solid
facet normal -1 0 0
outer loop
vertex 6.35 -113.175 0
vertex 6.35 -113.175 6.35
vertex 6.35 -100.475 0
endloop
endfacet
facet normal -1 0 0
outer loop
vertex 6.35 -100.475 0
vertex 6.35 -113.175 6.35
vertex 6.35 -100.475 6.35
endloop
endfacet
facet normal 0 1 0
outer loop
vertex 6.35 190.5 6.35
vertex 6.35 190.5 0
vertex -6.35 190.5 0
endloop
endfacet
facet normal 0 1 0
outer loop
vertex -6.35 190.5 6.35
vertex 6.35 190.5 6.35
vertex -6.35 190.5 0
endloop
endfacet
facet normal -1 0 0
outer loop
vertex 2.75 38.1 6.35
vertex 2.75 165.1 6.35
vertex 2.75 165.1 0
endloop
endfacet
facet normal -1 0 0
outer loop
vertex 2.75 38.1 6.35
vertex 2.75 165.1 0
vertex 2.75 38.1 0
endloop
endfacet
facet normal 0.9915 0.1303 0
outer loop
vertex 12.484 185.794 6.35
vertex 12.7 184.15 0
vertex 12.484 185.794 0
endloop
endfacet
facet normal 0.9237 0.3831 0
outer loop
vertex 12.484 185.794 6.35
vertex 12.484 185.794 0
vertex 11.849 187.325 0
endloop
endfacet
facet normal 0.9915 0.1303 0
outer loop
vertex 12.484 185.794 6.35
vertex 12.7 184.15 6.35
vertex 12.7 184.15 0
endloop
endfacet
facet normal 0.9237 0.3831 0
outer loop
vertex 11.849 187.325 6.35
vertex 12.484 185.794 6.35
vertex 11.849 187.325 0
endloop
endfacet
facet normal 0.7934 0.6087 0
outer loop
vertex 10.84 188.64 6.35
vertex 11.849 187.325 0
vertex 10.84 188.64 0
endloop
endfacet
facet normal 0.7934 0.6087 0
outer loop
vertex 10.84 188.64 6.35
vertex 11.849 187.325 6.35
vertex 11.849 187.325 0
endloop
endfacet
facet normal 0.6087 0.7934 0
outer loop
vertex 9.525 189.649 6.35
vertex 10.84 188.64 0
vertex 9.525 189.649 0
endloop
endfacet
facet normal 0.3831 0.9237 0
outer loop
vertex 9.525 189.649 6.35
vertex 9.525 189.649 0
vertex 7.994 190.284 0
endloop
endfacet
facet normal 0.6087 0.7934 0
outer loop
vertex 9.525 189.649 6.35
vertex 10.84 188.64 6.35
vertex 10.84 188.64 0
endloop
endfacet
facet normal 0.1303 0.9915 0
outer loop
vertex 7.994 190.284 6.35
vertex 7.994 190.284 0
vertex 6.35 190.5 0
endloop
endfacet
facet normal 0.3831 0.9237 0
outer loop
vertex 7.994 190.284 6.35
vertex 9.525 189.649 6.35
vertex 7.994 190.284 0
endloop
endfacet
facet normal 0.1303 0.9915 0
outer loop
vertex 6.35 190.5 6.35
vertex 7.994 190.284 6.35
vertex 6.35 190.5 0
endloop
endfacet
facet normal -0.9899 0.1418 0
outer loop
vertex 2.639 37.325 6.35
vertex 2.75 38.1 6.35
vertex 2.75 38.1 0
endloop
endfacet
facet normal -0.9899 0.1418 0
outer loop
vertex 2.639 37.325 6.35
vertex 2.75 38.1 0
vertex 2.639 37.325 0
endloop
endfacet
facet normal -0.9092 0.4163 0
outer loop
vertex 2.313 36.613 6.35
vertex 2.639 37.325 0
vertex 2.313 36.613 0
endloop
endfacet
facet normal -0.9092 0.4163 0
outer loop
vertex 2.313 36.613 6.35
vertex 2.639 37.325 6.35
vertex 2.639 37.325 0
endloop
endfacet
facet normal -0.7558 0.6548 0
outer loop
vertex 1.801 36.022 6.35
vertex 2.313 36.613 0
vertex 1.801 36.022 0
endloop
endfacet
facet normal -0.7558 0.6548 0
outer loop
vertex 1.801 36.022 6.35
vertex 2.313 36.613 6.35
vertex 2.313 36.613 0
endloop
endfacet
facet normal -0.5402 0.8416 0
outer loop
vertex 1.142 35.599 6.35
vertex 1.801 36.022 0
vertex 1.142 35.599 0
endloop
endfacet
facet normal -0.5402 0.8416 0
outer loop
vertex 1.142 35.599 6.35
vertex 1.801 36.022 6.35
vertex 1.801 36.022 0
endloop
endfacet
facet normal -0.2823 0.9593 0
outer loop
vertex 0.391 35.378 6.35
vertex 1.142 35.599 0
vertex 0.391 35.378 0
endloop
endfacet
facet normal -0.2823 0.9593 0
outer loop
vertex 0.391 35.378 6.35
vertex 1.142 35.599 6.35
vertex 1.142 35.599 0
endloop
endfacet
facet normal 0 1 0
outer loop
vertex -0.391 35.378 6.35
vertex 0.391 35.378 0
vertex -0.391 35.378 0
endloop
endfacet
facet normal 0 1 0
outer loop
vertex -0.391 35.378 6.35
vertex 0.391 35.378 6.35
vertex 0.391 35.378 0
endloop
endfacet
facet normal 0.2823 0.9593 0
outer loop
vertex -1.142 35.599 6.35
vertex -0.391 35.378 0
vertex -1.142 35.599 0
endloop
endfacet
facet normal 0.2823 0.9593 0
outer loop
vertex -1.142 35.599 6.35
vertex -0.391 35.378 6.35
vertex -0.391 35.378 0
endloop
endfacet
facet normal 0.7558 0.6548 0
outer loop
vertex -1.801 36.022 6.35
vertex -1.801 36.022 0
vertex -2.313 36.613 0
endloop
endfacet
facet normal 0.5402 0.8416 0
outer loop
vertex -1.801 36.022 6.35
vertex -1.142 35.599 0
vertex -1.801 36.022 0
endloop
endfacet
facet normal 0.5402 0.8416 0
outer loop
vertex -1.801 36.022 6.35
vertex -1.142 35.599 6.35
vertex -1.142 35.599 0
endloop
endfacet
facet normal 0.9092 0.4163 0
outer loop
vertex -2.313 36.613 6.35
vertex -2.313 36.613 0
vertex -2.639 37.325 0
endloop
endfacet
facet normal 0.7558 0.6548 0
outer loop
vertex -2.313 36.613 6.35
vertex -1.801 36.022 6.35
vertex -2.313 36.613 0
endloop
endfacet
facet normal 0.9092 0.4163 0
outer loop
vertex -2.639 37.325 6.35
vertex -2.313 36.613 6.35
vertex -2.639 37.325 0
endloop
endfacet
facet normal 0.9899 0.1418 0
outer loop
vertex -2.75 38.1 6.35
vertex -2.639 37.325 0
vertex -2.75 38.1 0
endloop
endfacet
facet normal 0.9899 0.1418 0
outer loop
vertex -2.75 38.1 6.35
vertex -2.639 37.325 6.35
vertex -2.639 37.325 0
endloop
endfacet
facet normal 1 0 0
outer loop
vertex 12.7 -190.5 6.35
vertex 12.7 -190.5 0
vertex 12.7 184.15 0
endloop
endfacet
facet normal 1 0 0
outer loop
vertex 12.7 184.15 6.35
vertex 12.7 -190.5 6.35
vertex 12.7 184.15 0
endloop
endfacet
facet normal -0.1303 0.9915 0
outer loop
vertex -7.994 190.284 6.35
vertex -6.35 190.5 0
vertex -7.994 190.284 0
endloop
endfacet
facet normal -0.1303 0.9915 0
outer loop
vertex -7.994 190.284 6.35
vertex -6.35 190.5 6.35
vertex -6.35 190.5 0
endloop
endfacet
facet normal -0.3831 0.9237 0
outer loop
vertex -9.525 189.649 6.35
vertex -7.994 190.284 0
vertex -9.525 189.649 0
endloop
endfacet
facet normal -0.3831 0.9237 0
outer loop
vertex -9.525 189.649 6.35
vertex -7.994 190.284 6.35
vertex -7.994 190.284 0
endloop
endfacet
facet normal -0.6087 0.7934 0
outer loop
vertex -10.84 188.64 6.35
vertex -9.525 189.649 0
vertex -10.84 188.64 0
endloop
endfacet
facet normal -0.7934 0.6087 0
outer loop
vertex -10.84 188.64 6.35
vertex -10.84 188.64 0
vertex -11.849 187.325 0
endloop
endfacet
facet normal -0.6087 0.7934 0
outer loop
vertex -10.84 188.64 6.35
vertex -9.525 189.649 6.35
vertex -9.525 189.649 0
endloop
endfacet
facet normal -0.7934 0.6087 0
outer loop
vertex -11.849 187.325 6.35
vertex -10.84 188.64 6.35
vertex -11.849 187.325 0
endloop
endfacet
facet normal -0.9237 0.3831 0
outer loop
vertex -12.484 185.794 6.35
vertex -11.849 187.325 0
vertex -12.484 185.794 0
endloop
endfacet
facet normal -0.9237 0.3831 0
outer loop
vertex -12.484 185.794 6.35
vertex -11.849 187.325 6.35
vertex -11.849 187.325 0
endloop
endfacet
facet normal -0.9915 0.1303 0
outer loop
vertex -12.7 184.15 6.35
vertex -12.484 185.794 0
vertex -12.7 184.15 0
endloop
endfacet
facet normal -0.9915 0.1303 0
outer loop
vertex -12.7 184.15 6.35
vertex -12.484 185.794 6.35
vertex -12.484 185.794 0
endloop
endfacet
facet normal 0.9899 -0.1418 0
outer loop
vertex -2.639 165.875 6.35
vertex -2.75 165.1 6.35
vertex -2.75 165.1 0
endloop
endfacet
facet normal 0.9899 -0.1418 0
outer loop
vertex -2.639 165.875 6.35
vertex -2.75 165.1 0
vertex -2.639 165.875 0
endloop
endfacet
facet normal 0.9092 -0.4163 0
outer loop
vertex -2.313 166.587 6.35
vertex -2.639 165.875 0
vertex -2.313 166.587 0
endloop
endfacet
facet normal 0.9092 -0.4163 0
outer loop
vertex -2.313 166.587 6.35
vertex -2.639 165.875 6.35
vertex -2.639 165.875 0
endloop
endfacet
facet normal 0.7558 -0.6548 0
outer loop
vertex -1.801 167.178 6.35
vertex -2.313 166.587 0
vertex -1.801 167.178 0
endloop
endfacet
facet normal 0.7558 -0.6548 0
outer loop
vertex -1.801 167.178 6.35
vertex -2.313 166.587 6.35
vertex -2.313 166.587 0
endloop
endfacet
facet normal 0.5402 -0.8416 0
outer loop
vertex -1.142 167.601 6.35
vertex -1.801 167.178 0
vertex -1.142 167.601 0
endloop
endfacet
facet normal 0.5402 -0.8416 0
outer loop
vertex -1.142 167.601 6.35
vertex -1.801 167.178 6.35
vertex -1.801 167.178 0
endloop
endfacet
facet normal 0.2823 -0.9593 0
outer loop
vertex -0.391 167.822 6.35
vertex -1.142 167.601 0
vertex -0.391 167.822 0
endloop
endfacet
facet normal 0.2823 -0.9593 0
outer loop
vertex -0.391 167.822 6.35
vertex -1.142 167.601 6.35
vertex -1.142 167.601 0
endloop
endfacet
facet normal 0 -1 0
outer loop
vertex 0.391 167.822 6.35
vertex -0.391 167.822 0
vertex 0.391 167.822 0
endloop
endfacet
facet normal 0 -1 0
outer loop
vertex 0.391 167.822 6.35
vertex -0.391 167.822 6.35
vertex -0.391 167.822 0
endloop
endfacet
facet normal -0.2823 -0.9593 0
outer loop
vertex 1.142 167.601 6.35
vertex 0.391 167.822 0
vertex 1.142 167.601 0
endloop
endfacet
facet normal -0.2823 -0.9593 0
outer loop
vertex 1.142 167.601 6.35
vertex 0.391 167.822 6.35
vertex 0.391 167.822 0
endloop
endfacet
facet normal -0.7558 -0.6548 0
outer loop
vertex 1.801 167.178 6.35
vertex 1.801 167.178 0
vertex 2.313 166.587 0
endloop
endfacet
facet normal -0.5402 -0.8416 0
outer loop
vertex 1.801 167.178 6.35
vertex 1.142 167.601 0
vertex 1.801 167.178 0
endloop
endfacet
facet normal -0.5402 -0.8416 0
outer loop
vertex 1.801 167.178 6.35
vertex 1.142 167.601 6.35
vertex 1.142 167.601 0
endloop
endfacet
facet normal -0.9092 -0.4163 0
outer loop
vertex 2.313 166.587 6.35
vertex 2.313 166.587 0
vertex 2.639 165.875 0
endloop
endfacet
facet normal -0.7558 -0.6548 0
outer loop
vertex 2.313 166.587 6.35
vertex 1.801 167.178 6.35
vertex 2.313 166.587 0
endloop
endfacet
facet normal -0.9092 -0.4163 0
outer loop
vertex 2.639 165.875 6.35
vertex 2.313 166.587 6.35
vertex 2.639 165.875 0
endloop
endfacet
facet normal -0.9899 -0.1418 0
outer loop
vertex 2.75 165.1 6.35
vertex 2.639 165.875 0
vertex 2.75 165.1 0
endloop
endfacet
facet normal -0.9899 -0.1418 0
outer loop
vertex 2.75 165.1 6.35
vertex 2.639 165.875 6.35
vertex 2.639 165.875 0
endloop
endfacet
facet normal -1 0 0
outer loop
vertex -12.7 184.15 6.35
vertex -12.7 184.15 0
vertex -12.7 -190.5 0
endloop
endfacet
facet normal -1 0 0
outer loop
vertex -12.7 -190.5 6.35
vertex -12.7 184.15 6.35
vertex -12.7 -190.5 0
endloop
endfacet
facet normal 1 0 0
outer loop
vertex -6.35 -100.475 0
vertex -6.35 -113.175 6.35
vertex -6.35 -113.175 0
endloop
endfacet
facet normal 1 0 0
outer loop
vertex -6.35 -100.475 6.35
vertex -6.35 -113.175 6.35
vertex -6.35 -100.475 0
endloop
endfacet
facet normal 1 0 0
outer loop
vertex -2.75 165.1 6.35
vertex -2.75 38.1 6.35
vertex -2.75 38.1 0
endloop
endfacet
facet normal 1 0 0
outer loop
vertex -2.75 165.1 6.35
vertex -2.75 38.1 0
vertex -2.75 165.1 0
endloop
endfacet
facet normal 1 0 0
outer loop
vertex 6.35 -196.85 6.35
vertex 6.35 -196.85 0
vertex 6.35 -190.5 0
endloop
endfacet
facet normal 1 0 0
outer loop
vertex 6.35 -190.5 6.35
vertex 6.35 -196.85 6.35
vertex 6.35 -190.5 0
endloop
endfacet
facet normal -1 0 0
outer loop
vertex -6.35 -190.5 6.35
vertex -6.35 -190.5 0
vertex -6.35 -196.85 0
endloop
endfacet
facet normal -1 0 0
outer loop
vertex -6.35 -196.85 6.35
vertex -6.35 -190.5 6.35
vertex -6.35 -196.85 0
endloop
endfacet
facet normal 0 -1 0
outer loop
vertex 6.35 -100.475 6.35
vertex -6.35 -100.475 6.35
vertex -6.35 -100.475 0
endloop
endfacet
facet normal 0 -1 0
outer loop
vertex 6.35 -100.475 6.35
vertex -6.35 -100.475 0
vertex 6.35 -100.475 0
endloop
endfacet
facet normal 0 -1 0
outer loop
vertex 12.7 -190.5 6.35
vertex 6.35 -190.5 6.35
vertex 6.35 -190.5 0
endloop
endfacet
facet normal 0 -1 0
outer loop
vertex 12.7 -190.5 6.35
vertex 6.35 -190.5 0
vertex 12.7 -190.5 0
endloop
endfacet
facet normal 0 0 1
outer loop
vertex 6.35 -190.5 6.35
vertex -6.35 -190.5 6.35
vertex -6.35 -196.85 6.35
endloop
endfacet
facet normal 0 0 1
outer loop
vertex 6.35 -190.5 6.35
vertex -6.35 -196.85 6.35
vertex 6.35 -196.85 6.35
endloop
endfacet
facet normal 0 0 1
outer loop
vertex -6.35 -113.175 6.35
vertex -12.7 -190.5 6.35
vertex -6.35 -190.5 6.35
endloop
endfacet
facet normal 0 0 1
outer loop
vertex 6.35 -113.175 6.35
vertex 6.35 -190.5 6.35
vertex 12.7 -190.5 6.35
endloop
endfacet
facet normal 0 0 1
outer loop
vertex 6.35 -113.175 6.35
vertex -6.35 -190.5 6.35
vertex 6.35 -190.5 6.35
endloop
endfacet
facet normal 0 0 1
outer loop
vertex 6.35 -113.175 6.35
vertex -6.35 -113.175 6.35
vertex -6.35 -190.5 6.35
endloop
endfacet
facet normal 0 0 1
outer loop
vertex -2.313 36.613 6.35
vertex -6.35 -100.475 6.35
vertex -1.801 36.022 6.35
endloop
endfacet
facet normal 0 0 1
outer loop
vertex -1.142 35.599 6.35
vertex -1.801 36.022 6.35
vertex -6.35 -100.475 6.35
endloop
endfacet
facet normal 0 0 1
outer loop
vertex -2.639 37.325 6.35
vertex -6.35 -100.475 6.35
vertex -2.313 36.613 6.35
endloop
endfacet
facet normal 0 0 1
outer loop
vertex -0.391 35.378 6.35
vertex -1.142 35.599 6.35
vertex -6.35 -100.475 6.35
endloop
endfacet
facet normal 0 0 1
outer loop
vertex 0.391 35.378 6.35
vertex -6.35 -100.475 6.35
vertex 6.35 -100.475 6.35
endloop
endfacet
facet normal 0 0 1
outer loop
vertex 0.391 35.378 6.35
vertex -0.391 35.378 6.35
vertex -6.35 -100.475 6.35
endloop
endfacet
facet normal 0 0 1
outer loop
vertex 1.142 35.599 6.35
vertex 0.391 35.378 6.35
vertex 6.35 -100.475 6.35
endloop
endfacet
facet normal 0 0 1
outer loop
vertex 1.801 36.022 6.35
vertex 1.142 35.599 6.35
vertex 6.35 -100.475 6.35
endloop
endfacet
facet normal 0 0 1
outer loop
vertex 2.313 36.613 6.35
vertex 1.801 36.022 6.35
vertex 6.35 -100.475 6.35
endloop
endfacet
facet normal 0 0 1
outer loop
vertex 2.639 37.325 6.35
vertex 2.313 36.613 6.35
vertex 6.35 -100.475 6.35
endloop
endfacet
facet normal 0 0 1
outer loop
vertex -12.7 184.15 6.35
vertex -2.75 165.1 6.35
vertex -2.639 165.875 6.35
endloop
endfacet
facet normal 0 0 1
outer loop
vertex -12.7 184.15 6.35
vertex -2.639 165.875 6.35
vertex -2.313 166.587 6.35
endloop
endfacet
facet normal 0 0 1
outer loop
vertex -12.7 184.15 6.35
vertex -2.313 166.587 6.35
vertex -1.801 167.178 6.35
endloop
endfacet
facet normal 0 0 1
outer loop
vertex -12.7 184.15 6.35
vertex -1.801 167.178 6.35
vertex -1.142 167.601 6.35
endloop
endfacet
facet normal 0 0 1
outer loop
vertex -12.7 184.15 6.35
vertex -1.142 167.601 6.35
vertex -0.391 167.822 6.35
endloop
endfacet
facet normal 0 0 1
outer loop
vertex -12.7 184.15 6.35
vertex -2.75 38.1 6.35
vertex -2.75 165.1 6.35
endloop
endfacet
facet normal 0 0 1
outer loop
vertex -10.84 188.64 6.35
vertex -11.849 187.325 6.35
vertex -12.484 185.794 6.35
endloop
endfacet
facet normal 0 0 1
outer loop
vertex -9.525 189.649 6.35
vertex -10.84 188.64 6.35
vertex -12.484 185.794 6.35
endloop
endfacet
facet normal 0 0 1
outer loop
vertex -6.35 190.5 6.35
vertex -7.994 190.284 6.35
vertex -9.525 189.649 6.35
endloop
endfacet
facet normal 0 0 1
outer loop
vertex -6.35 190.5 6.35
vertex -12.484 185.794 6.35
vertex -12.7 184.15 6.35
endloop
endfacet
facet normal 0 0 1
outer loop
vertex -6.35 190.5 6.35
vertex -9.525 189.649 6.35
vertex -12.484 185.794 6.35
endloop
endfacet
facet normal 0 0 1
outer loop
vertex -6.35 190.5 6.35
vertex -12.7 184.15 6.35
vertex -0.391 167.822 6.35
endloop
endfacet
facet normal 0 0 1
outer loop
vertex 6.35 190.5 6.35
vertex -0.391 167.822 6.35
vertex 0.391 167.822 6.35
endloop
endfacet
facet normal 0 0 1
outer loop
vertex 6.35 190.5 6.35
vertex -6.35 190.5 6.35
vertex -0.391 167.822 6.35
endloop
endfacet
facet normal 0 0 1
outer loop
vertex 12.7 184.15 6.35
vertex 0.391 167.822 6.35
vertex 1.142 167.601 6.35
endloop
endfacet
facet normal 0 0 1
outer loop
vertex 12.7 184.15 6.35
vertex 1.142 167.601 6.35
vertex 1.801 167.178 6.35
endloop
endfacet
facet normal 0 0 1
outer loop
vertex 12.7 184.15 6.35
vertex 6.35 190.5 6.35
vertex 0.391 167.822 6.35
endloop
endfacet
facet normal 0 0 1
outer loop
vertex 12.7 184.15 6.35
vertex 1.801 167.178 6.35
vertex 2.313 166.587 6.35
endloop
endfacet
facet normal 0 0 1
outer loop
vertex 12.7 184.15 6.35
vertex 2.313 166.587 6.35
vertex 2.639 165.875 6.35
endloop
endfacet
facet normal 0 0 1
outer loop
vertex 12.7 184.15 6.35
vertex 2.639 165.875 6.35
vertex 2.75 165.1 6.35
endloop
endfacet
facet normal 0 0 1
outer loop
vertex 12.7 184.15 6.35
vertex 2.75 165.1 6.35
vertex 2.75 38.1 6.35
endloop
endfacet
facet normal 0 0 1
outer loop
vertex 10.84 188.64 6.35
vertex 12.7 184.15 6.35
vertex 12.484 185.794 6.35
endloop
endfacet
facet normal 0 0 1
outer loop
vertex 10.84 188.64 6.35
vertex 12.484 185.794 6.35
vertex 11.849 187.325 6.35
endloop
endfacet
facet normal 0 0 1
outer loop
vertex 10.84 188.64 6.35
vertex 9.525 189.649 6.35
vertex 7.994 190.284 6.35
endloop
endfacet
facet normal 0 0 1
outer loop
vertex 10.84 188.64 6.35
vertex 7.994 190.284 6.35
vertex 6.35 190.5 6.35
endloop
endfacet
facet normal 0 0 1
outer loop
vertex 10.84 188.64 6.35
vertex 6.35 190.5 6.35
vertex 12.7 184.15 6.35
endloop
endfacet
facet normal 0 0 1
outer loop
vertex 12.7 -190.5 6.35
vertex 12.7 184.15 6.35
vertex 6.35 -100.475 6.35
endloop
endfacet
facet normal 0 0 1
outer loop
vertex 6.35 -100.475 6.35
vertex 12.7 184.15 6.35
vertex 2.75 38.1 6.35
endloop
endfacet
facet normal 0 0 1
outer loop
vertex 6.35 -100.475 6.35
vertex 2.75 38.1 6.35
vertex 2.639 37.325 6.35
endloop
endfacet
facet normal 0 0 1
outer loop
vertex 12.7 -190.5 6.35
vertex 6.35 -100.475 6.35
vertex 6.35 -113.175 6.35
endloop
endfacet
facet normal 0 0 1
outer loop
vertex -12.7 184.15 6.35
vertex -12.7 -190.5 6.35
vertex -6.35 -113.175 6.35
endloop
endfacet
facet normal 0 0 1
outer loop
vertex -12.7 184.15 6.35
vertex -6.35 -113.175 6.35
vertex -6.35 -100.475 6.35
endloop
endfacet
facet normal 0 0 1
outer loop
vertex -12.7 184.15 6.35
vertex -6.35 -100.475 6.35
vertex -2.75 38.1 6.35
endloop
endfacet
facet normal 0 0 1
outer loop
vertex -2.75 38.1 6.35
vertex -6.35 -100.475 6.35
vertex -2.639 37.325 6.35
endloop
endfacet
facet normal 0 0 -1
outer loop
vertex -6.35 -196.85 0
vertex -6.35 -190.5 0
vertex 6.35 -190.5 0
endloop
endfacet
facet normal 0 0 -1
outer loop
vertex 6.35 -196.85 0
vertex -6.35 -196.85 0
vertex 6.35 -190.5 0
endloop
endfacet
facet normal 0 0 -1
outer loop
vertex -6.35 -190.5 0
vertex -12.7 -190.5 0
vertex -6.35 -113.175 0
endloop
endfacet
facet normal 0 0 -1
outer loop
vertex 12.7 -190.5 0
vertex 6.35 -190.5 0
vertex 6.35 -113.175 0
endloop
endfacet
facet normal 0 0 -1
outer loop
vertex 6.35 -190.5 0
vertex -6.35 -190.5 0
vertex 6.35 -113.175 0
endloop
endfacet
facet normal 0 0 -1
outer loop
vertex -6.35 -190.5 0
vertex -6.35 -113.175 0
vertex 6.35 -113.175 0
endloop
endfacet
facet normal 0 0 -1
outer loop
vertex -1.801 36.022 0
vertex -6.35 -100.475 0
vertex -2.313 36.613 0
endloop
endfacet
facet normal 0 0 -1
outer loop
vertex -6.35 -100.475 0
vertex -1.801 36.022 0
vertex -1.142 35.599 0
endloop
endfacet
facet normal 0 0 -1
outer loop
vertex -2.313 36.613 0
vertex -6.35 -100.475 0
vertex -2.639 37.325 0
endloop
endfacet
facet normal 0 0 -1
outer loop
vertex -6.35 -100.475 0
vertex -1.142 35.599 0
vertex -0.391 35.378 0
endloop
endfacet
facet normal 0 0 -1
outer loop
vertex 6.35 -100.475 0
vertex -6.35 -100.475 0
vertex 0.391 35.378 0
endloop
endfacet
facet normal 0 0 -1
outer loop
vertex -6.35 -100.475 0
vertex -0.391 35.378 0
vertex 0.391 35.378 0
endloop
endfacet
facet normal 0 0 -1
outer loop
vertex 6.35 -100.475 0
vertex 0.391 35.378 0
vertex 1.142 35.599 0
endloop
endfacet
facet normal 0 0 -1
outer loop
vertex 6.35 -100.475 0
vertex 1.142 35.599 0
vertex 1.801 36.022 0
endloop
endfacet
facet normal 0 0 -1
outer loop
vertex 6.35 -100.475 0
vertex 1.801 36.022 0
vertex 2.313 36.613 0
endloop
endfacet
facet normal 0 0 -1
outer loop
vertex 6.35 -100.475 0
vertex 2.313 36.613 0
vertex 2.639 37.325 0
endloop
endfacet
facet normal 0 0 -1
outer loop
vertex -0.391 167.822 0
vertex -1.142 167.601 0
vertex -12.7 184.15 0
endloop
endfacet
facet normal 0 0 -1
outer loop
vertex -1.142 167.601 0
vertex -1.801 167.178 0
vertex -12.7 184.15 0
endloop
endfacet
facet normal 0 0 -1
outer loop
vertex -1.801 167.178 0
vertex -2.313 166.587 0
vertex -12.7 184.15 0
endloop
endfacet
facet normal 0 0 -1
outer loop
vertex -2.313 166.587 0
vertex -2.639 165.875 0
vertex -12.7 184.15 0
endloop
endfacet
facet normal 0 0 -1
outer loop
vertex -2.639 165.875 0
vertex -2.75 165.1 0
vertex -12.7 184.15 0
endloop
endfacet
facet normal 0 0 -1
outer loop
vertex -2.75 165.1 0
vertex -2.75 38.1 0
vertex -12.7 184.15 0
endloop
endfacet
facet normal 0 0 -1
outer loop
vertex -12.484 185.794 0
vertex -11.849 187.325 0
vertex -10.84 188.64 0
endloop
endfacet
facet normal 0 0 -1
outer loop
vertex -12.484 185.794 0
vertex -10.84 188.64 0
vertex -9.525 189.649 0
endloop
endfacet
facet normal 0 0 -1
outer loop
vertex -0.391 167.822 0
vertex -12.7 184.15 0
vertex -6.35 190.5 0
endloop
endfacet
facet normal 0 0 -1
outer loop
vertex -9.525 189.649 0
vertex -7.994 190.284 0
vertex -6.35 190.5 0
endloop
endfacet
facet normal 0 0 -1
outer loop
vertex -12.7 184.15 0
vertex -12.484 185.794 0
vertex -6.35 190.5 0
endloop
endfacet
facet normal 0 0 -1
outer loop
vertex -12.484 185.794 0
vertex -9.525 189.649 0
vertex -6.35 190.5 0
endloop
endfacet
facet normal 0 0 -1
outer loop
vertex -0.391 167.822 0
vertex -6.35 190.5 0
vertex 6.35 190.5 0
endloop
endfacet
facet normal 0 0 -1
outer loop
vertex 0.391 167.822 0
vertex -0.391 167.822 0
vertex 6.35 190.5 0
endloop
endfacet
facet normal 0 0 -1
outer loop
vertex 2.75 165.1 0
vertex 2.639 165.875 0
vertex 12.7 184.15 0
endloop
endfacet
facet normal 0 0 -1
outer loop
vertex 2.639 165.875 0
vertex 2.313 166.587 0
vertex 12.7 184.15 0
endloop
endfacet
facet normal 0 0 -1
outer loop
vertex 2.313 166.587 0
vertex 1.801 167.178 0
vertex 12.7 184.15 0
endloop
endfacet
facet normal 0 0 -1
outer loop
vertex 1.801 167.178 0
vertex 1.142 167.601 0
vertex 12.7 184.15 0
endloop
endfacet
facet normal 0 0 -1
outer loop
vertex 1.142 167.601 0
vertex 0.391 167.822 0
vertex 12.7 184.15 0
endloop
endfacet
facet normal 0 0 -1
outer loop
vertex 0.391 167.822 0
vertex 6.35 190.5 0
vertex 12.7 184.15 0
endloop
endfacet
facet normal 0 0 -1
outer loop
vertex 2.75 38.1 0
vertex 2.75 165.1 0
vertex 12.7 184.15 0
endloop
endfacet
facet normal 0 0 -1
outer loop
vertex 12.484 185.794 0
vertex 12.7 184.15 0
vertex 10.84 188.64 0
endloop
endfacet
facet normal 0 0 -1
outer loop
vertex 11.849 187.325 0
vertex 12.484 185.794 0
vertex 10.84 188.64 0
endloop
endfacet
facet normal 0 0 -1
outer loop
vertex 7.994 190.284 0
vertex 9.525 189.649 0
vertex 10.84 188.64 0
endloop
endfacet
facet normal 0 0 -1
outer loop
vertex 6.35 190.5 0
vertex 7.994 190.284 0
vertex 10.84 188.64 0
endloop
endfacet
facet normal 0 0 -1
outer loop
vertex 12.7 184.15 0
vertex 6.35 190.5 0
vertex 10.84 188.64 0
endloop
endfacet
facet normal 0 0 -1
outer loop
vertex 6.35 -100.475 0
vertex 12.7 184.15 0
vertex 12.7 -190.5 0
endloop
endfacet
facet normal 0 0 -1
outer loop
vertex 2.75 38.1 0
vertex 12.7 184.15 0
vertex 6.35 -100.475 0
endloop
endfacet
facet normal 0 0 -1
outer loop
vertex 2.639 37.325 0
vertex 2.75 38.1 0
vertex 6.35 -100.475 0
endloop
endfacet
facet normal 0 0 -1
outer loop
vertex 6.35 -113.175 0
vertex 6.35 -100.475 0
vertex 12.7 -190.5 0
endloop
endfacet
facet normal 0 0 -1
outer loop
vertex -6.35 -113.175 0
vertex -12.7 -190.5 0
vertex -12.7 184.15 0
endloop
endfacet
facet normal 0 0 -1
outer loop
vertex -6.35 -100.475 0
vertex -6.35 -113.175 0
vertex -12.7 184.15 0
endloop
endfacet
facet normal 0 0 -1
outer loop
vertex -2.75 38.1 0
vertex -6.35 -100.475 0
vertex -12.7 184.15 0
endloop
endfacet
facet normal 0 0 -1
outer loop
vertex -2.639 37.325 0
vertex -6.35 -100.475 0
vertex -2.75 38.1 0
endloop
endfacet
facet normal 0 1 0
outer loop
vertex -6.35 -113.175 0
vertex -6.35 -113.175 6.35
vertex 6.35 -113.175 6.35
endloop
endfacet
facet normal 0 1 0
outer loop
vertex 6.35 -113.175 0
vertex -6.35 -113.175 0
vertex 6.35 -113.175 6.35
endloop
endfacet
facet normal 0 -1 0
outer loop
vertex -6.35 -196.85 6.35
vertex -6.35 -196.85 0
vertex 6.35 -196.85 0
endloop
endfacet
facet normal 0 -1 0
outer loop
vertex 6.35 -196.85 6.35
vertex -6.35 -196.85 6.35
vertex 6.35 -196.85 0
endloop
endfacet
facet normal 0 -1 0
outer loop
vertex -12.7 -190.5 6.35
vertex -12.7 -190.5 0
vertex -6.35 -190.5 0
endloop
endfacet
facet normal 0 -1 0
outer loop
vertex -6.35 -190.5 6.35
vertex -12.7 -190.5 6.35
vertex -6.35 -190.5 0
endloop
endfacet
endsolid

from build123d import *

# Parameters (mm, degrees)
BOSS_EXTRU_1_DEPTH      = 6.35
ESQUISSE3_W             = 12.7
ESQUISSE3_H             = 12.7
ENL_V_MAT_EXTRU_1_DEPTH = 198.361432403
ENL_V_MAT_EXTRU_2_DEPTH = 198.361432403
CONG_1_R                = 6.35


with BuildPart() as part:
    # Esquisse2 → Boss.-Extru.1 (new body)
    with BuildSketch(Plane.XY):
        Polygon((6.35, -190.5), (12.7, -190.5), (12.7, 190.5), (-12.7, 190.5), (-12.7, -190.5), (-6.35, -190.5), (-6.35, -196.85), (6.35, -196.85), align=None)
    extrude(amount=BOSS_EXTRU_1_DEPTH)

    # Esquisse3 → Enlèv. mat.-Extru.1 (cut, through all)
    with BuildSketch(Plane.XY.offset(6.35)):
        with Locations((0, -106.82478)):
            Rectangle(ESQUISSE3_W, ESQUISSE3_H)
    extrude(amount=-ENL_V_MAT_EXTRU_1_DEPTH, mode=Mode.SUBTRACT)

    # Esquisse4 → Enlèv. mat.-Extru.2 (cut, through all)
    with BuildSketch(Plane.XY.offset(6.35)):
        with BuildLine():
            Line((2.75, 165.1), (2.75, 38.1))
            ThreePointArc((2.75, 38.1), (0, 35.35), (-2.75, 38.1))
            Line((-2.75, 38.1), (-2.75, 165.1))
            ThreePointArc((-2.75, 165.1), (0, 167.85), (2.75, 165.1))
        make_face()
    extrude(amount=-ENL_V_MAT_EXTRU_2_DEPTH, mode=Mode.SUBTRACT)

    # Congé1
    cong_1_edges = [part.edges().sort_by_distance(p)[0] for p in [
        (-12.7, 190.5, 3.175),
        (12.7, 190.5, 3.175),
    ]]
    fillet(cong_1_edges, radius=CONG_1_R)


solid = part.part
